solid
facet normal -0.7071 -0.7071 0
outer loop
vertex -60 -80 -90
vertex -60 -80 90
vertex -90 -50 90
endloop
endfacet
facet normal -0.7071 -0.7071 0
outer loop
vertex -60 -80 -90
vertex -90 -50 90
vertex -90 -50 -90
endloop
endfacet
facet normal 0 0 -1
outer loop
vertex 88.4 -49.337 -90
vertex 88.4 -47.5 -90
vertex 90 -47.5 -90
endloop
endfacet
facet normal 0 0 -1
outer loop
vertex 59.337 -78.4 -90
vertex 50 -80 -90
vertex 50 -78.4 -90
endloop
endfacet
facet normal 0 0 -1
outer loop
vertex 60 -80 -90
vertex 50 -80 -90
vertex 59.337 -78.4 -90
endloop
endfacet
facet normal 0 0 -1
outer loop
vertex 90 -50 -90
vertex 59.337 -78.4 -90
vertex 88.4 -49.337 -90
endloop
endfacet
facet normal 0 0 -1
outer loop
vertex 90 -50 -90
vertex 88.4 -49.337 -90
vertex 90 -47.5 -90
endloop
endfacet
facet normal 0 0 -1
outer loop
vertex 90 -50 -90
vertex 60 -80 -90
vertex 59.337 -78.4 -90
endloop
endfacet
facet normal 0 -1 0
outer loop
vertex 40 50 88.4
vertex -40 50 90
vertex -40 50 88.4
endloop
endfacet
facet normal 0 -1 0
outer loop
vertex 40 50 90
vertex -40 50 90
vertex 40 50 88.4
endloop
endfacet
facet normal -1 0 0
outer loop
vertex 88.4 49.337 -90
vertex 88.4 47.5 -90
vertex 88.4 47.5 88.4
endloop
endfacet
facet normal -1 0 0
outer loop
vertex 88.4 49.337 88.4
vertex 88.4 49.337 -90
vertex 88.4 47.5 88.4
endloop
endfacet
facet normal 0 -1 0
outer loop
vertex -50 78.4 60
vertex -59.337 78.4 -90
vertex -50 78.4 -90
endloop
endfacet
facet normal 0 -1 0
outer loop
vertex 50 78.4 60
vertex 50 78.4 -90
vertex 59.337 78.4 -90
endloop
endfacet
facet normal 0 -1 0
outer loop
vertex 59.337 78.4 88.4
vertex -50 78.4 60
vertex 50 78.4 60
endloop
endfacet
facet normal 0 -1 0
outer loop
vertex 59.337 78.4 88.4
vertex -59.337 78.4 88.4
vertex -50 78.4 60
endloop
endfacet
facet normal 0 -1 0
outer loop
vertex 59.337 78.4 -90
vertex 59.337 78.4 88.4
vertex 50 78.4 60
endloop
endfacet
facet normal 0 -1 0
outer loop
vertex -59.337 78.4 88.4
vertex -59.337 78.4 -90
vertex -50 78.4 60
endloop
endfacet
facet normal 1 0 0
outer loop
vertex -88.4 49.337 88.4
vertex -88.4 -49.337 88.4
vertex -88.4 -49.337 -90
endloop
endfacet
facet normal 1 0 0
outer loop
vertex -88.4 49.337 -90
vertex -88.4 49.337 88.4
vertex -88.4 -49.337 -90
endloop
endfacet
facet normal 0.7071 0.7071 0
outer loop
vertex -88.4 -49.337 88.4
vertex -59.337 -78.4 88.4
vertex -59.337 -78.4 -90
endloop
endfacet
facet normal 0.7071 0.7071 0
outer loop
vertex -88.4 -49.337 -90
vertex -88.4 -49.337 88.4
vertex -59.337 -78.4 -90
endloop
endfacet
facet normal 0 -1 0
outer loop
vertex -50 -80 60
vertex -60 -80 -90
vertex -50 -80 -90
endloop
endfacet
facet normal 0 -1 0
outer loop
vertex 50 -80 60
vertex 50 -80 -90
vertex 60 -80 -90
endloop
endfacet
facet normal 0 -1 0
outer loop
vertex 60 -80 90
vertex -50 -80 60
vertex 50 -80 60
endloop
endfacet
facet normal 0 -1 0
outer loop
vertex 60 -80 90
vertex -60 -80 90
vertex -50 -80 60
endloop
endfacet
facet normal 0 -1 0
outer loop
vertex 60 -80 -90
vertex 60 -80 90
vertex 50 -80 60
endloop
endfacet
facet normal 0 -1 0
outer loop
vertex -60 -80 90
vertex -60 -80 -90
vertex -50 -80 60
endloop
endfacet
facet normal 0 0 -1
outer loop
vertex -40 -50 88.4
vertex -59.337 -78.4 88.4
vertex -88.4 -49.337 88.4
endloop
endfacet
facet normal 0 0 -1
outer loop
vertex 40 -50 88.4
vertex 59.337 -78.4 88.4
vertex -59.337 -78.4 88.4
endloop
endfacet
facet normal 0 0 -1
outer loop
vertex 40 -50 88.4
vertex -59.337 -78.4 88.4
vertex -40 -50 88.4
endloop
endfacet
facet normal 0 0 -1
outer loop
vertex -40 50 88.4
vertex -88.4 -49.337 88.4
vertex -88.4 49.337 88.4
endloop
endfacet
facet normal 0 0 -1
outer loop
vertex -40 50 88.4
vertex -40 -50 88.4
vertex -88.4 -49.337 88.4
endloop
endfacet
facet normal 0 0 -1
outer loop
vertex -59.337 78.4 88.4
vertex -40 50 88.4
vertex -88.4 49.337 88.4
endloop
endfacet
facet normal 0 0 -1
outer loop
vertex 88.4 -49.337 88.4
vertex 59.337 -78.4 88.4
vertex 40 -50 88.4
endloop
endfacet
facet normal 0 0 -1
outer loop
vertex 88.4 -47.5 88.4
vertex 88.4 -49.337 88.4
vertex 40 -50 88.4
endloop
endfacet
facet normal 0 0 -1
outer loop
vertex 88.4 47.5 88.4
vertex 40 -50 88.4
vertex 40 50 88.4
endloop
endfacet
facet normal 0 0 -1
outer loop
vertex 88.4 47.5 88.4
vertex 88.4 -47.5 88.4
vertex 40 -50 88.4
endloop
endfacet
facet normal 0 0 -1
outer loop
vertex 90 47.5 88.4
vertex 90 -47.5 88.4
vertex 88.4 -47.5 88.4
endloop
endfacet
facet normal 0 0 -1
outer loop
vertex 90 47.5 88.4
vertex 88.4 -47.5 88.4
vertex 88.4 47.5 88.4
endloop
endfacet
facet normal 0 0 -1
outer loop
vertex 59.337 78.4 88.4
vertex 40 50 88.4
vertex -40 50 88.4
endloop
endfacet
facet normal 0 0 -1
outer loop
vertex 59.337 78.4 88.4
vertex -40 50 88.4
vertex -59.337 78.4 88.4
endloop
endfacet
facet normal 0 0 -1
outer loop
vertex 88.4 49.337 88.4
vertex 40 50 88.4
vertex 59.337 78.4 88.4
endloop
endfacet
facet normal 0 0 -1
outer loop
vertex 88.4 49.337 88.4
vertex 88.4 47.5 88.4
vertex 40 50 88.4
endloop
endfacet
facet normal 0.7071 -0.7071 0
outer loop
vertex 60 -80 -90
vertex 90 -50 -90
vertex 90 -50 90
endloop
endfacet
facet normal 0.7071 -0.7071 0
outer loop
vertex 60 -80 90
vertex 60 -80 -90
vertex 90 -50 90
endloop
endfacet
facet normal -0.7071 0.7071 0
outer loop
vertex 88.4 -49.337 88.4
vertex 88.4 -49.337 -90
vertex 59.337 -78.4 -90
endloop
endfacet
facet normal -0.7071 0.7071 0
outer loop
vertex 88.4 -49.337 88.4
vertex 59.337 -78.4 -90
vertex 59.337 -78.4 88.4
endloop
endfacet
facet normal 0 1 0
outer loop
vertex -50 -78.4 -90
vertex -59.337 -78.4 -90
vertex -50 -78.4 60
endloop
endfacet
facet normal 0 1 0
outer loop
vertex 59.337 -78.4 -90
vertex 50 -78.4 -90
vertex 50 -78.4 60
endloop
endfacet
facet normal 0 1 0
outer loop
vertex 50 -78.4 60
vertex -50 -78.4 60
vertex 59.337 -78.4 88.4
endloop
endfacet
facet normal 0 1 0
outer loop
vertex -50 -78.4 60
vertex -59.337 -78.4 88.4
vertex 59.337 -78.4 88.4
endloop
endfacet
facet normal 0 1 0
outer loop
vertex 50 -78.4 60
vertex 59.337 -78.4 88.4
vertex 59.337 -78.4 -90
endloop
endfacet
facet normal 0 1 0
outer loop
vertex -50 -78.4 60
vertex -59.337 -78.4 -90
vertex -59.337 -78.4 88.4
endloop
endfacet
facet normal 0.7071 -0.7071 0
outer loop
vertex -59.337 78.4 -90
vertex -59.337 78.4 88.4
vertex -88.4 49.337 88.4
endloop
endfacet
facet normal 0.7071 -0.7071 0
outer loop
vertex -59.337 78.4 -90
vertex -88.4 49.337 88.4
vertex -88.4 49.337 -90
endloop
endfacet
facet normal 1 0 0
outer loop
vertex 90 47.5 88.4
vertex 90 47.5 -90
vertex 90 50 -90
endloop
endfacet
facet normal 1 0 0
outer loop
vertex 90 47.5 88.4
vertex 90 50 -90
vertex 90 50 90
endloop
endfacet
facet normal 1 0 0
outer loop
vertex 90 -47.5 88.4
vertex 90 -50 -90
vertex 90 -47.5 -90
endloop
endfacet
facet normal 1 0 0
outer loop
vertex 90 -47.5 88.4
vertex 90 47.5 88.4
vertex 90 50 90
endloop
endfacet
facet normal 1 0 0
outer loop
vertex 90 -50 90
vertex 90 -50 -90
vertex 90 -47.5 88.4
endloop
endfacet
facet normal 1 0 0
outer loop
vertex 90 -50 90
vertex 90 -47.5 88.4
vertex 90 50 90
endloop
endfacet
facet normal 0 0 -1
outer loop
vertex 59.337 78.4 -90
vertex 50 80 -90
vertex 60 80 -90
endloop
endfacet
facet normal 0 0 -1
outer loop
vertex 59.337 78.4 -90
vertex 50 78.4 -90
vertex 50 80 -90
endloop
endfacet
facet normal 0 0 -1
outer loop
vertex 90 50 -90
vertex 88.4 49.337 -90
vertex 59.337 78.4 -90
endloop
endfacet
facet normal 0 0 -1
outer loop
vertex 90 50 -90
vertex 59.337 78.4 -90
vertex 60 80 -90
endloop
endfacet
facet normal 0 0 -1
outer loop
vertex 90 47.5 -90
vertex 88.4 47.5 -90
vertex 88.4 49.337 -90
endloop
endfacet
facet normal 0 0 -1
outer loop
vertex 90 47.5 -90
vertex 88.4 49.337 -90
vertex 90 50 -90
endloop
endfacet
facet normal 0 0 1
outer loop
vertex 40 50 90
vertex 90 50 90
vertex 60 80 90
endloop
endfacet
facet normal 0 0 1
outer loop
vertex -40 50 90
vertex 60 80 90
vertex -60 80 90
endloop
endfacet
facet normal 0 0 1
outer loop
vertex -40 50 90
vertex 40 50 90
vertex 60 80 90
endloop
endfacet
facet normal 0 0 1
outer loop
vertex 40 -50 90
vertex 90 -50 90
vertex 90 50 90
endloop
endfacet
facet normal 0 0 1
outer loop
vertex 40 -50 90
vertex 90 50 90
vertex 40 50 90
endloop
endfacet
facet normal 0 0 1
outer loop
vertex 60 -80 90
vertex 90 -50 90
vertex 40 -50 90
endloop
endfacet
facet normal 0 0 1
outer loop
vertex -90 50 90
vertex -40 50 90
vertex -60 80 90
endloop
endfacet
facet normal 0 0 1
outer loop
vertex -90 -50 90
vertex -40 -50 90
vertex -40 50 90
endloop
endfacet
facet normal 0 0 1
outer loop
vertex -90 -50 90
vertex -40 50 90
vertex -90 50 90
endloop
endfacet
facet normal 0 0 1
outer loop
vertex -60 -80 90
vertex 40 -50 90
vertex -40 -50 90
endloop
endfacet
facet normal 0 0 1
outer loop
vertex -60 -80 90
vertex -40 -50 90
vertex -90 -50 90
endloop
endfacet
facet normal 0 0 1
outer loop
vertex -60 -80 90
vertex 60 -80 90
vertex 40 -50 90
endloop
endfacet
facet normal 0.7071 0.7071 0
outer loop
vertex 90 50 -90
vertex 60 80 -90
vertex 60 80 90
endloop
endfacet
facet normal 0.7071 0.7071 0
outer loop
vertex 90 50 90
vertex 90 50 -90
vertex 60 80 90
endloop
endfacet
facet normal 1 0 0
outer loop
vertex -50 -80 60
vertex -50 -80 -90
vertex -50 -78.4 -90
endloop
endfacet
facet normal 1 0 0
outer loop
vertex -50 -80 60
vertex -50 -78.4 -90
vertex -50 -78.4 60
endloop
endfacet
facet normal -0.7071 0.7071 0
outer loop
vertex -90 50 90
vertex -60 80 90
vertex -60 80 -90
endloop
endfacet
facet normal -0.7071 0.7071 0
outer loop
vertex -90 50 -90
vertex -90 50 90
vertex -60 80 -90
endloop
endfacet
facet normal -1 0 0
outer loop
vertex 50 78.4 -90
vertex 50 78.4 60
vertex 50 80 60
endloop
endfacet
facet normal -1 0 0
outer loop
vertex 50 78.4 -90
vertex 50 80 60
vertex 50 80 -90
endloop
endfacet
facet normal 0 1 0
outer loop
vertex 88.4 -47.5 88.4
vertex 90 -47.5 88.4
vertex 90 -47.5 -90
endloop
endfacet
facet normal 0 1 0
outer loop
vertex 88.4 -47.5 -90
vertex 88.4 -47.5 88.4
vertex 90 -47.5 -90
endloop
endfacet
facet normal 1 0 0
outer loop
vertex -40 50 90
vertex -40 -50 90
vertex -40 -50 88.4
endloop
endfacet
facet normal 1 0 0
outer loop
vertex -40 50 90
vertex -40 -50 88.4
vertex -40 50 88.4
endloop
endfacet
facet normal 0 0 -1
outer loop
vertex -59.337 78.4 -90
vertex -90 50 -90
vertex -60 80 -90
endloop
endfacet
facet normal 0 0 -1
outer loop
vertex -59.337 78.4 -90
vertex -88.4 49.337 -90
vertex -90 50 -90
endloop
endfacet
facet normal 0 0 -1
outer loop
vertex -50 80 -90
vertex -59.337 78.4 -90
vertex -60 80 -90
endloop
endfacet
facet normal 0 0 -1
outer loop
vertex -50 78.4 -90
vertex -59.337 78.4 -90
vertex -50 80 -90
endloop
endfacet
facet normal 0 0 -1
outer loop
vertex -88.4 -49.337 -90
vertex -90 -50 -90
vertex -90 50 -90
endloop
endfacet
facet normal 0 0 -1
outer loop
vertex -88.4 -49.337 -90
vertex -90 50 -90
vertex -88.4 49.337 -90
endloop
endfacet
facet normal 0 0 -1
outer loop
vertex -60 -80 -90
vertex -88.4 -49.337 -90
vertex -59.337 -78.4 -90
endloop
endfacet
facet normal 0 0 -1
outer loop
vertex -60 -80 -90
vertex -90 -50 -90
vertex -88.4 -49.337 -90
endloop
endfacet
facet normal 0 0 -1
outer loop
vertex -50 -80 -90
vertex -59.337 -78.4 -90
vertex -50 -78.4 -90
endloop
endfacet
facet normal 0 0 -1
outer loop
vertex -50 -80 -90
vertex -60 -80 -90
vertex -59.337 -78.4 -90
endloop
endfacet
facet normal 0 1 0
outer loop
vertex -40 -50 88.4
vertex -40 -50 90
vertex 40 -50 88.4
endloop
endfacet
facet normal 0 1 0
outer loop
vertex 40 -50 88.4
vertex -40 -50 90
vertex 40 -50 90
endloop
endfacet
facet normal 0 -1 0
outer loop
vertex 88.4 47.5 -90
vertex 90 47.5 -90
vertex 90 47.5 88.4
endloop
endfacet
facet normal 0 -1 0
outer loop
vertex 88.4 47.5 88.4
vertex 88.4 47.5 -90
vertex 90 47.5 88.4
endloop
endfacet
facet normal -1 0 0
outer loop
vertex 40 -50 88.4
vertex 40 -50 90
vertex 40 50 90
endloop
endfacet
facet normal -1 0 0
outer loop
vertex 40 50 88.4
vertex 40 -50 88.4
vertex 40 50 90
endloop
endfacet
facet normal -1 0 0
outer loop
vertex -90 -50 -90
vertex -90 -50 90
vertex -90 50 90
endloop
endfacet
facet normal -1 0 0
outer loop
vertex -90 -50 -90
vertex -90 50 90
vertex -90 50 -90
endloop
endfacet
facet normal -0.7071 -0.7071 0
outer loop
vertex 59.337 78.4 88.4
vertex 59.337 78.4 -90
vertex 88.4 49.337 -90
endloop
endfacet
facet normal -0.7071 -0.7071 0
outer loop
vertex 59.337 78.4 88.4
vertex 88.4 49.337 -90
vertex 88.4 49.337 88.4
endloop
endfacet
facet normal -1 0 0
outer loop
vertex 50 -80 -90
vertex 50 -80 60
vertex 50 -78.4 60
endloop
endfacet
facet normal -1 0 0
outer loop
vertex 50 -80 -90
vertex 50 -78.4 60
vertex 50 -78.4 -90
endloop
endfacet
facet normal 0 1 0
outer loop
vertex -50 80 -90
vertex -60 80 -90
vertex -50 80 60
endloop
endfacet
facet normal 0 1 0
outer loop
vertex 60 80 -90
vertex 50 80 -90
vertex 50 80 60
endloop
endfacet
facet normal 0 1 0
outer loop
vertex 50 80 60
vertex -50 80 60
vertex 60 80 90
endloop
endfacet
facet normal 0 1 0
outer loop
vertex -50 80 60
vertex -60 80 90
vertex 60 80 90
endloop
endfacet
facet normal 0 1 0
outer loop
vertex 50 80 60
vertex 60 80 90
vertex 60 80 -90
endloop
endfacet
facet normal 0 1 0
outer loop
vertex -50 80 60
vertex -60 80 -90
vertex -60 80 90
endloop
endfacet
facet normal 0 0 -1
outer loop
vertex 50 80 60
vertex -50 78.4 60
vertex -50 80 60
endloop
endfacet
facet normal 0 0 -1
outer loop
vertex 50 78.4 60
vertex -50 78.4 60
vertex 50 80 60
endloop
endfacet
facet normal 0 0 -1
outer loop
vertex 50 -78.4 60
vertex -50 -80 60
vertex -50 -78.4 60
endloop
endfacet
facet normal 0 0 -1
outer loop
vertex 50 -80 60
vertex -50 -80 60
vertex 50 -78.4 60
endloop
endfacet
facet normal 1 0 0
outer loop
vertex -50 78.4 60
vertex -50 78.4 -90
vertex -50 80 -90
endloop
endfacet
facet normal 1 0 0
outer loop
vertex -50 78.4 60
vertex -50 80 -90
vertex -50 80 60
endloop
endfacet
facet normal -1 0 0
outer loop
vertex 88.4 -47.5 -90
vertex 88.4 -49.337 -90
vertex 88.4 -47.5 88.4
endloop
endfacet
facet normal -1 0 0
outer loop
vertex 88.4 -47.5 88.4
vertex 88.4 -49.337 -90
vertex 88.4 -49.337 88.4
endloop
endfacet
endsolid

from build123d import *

# Parameters (mm, degrees)
F1_DEPTH = 80
F2_SIZE  = 30
F3_T     = -1.6
F4_W     = 95
F4_H     = 118.4
F4_H_2   = 60
F5_DEPTH = 25
F6_W     = 80
F6_H     = 100
F7_DEPTH = 25


with BuildPart() as f1:
    # F0 (on Front) → F1 (new body, symmetric)
    with BuildSketch(Plane.XZ):
        Polygon((50, -90), (90, -90), (90, 90), (-90, 90), (-90, -90), (-50, -90), (-50, 60), (0, 60), (50, 60), align=None)
    extrude(amount=F1_DEPTH, both=True)

    # F2
    f2_edges = [f1.edges().sort_by_distance(p)[0] for p in [
        (-90, -80, 0),
        (90, -80, 0),
        (90, 80, 0),
        (-90, 80, 0),
    ]]
    chamfer(f2_edges, length=F2_SIZE)

    # F3
    f3_openings = [f1.faces().sort_by_distance(p)[0] for p in [
        (68.363636, 0, -90),
        (-68.363636, 0, -90),
        (0, 0, 60),
        (50, 0, -15),
        (-50, 0, -15),
    ]]
    offset(amount=F3_T, openings=f3_openings)

    # F4 (on face) → F5 (cut)
    with BuildSketch(Plane.YZ.offset(90)):
        with Locations((0, -30.8)):
            Rectangle(F4_W, F4_H)
        with Locations((0, 58.4)):
            Rectangle(F4_W, F4_H_2)
    extrude(amount=-F5_DEPTH, mode=Mode.SUBTRACT)

    # F6 (on face) → F7 (cut)
    with BuildSketch(Plane.XY.offset(90)):
        Rectangle(F6_W, F6_H)
    extrude(amount=-F7_DEPTH, mode=Mode.SUBTRACT)


solid = f1.part
